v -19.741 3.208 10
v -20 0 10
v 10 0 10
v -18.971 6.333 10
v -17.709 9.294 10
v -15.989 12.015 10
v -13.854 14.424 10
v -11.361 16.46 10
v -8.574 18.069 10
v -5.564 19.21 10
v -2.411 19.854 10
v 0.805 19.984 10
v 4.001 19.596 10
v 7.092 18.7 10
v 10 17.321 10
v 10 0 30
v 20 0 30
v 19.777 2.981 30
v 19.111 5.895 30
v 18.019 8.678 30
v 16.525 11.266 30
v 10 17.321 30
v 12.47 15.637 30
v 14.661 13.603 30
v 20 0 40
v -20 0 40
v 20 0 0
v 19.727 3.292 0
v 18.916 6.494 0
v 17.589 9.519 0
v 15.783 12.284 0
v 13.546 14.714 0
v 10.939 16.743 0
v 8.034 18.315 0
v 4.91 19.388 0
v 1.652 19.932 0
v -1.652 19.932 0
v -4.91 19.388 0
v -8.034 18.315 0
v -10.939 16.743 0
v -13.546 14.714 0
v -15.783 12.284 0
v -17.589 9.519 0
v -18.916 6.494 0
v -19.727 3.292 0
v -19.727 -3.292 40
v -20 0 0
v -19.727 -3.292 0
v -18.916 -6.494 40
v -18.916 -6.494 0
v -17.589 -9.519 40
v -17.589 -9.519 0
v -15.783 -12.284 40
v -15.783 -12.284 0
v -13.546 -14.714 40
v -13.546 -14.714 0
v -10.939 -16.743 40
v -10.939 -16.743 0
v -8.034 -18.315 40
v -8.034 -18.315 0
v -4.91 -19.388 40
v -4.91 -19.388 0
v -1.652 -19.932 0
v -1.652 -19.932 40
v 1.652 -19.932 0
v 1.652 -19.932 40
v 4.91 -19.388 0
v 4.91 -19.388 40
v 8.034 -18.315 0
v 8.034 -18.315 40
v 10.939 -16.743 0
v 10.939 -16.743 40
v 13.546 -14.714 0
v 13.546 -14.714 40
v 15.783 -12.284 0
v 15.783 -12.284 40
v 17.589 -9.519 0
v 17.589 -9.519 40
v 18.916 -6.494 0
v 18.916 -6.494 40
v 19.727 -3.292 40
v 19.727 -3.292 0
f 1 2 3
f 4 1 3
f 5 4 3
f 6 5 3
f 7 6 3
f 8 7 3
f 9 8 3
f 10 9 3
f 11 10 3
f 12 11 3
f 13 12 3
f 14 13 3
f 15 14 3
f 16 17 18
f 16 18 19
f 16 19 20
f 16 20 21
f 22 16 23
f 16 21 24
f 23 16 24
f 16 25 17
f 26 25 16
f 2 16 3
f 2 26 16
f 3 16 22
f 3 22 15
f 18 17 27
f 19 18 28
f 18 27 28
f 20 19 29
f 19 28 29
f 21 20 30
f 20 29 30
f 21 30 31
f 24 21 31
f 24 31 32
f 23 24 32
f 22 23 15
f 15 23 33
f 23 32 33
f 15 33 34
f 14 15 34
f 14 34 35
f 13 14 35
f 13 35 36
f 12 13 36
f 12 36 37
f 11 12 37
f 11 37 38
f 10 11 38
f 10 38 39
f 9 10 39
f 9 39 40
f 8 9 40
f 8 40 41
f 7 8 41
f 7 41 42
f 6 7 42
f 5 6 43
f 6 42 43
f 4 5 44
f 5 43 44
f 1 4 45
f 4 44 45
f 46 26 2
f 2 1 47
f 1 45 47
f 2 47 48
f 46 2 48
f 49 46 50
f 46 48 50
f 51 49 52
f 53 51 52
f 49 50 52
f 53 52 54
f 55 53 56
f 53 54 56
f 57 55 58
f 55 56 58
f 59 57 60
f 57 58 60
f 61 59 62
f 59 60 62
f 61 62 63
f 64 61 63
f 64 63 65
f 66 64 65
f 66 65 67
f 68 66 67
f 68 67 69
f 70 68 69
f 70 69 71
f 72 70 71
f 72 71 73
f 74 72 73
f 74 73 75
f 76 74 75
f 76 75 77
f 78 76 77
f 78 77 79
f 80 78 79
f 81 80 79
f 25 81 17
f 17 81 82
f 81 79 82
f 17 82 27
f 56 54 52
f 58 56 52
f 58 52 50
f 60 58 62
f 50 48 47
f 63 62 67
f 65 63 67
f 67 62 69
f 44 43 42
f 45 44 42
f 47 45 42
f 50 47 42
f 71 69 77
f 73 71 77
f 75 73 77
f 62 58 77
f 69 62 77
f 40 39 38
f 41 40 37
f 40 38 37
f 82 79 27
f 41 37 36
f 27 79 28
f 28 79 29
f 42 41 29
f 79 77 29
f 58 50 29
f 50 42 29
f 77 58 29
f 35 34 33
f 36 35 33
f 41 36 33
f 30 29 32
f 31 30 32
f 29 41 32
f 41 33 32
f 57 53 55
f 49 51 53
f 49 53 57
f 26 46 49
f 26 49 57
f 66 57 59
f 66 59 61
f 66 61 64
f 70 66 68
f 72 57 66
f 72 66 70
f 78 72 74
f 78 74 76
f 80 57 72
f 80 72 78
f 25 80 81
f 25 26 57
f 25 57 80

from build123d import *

# Parameters (mm, degrees)
SKETCH1_R               = 20
BOSS_EXTRUDE1_DEPTH     = 40
CUT_EXTRUDE1_DEPTH      = 40
CUT_EXTRUDE1_DEPTH_BACK = 40
SKETCH2_W               = 30
SKETCH2_H               = 2
CUT_EXTRUDE2_DEPTH      = 40
CUT_EXTRUDE2_DEPTH_BACK = 40
SKETCH3_W               = 10
SKETCH3_H               = 20
SKETCH4_W               = 30
SKETCH4_H               = 20
CUT_EXTRUDE4_DEPTH      = 40


with BuildPart() as part:
    # Sketch1 → Boss-Extrude1 (new body)
    with BuildSketch(Plane.XY):
        Circle(SKETCH1_R)
    extrude(amount=BOSS_EXTRUDE1_DEPTH)

    # Sketch2 → Cut-Extrude1 (cut, two sides: drawn at the far end of the back side and taken through both)
    with BuildSketch(Plane(origin=(0, 0, 0), x_dir=(0, 0, -1), z_dir=(1, 0, 0)).offset(-CUT_EXTRUDE1_DEPTH_BACK)):
        with Locations((-25, 19)):
            Rectangle(SKETCH2_W, SKETCH2_H)
    extrude(amount=CUT_EXTRUDE1_DEPTH + CUT_EXTRUDE1_DEPTH_BACK, mode=Mode.SUBTRACT)

    # Sketch3 → Cut-Extrude2 (cut, two sides: drawn at the far end of the back side and taken through both)
    with BuildSketch(Plane(origin=(0, 0, 0), x_dir=(0, 0, -1), z_dir=(1, 0, 0)).offset(-CUT_EXTRUDE2_DEPTH_BACK)):
        with Locations((-35, 10)):
            Rectangle(SKETCH3_W, SKETCH3_H)
    extrude(amount=CUT_EXTRUDE2_DEPTH + CUT_EXTRUDE2_DEPTH_BACK, mode=Mode.SUBTRACT)

    # Sketch4 → Cut-Extrude4 (cut)
    with BuildSketch(Plane(origin=(0, 0, 0), x_dir=(1, 0, 0), z_dir=(0, 1, 0))):
        with Locations((-5, -20)):
            Rectangle(SKETCH4_W, SKETCH4_H)
    extrude(amount=CUT_EXTRUDE4_DEPTH, mode=Mode.SUBTRACT)


solid = part.part
